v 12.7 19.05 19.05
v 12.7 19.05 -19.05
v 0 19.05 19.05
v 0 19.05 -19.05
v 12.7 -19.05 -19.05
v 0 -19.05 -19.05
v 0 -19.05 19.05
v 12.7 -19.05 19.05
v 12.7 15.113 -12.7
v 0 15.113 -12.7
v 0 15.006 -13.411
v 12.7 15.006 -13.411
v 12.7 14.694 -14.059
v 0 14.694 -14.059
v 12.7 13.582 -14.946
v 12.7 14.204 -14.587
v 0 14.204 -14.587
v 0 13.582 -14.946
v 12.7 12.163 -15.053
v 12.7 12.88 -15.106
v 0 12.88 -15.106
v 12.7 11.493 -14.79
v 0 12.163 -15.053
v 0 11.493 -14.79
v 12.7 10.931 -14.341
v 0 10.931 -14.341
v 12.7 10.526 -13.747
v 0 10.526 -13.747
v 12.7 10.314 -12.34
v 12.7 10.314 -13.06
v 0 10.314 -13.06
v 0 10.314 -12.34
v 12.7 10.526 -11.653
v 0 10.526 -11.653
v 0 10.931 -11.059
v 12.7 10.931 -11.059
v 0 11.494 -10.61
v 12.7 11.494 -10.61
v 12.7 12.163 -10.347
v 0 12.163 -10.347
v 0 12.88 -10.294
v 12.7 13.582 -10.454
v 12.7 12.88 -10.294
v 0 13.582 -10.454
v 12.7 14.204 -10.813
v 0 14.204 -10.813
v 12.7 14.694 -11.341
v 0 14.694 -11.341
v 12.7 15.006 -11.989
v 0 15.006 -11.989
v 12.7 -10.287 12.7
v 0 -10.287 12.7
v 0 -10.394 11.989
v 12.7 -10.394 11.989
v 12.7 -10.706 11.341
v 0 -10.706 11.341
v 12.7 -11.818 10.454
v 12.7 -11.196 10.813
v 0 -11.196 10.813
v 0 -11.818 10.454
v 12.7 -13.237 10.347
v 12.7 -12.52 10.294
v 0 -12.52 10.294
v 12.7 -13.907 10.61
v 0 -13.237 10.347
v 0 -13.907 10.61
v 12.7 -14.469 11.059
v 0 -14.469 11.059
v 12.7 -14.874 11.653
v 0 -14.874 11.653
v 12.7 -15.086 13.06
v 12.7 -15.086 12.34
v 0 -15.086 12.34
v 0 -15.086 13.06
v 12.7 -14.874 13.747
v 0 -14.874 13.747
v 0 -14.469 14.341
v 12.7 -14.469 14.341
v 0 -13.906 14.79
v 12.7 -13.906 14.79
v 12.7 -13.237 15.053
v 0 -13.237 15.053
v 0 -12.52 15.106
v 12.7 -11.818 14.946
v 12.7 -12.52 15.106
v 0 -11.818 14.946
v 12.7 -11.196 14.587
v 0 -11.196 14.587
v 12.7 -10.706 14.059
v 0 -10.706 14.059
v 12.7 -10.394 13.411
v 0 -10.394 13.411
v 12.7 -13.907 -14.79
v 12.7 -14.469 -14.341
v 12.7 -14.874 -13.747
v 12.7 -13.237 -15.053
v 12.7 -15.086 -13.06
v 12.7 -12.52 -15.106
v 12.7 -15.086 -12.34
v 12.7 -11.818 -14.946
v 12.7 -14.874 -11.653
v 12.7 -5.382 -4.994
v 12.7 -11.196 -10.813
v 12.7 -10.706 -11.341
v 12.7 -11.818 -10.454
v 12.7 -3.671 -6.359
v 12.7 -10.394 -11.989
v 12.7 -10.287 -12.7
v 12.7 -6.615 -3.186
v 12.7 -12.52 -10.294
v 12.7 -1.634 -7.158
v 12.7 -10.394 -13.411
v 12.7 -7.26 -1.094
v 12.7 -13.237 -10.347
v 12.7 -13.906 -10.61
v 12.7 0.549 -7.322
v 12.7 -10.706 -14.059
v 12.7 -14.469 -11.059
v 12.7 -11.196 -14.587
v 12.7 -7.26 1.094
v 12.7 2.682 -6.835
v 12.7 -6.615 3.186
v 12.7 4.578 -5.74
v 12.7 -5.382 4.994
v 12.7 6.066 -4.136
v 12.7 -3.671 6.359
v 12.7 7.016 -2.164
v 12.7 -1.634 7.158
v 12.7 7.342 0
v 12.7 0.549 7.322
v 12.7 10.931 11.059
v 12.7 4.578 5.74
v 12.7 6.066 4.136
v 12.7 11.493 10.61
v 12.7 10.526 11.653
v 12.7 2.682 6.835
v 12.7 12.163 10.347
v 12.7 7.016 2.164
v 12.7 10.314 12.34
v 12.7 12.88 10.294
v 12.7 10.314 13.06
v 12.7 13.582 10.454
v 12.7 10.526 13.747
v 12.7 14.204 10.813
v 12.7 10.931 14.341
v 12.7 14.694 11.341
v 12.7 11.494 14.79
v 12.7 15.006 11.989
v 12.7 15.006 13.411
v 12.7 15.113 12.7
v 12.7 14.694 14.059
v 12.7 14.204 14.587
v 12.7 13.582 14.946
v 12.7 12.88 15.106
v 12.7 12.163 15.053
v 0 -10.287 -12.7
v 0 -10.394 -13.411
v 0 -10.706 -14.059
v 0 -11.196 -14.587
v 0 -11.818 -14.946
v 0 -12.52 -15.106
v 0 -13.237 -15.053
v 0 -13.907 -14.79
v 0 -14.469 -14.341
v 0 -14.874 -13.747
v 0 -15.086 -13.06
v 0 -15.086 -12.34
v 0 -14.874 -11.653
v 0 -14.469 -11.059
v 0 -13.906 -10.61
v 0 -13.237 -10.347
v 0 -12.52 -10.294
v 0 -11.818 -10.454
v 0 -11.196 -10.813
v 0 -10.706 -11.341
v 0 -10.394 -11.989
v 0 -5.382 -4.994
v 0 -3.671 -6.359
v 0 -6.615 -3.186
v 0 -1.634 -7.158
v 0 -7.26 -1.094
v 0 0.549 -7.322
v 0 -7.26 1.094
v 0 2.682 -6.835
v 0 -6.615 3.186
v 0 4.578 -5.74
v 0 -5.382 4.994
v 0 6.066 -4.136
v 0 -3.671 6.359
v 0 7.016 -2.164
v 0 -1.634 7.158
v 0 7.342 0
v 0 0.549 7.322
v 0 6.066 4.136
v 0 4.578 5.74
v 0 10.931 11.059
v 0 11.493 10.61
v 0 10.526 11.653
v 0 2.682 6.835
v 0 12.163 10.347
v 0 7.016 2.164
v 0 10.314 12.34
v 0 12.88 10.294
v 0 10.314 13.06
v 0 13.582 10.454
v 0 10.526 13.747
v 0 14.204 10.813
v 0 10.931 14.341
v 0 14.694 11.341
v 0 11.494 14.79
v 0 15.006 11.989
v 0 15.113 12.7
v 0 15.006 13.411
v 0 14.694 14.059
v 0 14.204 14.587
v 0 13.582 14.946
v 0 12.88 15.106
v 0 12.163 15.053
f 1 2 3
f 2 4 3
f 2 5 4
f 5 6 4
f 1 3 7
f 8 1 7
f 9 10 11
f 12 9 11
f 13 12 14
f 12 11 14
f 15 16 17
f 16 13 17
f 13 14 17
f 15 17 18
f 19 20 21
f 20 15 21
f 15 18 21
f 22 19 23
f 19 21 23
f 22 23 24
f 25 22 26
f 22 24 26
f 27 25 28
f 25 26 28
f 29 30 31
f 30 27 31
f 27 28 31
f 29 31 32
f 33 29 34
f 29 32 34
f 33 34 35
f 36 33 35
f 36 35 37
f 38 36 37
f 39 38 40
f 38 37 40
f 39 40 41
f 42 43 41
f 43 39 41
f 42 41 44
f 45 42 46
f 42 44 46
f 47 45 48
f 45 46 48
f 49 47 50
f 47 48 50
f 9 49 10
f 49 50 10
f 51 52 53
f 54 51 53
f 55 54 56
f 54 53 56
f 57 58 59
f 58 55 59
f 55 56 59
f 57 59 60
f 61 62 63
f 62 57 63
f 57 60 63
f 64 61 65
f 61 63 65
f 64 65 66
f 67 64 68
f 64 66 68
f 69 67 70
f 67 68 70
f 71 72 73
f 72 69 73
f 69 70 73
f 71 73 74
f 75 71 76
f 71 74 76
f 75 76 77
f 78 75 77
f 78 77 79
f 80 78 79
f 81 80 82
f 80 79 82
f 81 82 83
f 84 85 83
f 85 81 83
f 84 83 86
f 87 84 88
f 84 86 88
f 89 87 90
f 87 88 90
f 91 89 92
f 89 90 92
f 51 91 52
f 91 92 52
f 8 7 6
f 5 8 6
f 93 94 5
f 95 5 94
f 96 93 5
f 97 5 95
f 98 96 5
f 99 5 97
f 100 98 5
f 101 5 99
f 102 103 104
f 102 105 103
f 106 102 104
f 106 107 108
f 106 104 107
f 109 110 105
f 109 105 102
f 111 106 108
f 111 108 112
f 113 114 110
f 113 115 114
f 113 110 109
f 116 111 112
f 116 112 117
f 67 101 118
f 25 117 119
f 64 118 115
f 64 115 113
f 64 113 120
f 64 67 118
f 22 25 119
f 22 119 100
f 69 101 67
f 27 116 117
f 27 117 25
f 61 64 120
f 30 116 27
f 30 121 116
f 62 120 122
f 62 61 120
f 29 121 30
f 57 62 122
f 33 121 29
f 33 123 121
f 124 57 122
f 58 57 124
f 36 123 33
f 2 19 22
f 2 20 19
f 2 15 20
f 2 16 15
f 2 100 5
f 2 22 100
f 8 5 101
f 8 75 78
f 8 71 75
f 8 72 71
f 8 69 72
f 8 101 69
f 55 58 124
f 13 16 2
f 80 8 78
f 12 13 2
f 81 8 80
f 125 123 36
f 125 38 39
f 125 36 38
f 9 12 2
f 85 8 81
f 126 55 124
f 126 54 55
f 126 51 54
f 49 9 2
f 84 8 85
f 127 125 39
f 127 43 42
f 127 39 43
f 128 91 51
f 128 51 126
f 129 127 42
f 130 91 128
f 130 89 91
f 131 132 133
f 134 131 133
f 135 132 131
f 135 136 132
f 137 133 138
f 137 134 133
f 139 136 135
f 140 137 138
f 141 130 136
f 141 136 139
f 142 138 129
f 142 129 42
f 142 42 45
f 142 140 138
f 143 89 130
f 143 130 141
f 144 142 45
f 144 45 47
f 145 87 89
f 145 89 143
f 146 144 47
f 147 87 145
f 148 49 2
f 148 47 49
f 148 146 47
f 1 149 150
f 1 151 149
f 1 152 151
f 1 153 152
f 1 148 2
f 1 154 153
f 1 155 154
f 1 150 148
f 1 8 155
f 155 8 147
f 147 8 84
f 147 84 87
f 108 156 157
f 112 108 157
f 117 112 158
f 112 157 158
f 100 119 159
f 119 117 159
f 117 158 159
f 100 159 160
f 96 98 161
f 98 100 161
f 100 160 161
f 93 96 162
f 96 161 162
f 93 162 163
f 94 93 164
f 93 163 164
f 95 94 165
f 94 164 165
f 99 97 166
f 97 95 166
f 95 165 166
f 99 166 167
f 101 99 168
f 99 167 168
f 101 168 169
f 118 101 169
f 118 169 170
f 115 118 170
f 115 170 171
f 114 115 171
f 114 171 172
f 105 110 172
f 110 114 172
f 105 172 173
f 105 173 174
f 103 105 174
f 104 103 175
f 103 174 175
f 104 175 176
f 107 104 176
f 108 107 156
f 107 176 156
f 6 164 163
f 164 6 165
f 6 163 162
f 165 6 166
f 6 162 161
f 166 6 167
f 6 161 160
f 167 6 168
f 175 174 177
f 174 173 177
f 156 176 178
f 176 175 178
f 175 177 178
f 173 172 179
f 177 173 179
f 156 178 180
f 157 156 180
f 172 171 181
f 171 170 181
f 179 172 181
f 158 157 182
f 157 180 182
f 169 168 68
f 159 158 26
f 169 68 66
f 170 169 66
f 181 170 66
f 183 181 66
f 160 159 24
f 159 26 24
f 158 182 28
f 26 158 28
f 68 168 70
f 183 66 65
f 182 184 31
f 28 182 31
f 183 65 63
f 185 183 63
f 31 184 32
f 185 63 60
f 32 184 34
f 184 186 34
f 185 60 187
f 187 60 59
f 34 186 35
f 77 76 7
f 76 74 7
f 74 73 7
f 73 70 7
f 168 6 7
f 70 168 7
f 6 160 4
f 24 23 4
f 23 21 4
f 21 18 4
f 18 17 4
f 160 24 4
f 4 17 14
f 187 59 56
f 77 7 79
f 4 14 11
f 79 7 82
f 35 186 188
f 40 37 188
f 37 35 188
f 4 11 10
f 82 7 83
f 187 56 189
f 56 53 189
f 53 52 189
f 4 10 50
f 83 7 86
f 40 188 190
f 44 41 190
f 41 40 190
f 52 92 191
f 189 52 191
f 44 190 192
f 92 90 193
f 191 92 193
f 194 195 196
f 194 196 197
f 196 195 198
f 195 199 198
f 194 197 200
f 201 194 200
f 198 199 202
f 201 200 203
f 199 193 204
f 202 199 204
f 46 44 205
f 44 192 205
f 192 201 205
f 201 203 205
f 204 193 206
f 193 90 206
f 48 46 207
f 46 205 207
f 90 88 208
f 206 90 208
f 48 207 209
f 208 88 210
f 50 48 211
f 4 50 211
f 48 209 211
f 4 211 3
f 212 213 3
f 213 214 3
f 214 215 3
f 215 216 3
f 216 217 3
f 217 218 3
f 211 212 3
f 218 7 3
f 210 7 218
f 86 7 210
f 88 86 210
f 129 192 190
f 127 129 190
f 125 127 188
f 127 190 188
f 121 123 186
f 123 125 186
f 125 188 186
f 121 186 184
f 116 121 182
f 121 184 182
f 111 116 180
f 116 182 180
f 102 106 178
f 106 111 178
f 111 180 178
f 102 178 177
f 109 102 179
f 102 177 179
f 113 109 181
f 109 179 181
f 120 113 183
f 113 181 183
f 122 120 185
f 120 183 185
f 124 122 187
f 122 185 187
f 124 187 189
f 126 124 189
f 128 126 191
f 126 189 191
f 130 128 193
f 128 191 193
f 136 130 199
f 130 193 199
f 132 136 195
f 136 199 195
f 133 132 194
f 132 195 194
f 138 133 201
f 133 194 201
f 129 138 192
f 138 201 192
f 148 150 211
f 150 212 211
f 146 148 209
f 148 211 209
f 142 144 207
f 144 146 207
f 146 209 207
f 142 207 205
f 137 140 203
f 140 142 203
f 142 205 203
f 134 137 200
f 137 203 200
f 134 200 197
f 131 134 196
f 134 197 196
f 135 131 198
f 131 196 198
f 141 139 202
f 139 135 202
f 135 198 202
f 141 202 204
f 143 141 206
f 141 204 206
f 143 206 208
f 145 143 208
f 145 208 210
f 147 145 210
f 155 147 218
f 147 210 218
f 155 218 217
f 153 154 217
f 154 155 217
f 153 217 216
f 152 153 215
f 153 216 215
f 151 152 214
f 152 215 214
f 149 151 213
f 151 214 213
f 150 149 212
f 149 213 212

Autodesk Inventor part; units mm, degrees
ref_plane "YZ Plane" through (0, 0, 0) normal (1, 0, 0) x (0, 1, 0)
ref_plane "XZ Plane" through (0, 0, 0) normal (0, 1, 0) x (-1, 0, 0)
ref_plane "XY Plane" through (0, 0, 0) normal (0, 0, 1) x (1, 0, 0)
sketch "Sketch1" plane through (0, 0, 0) normal (1, 0, 0) x (0, 1, 0)
  line L0 (0, -26.67) -> (0, 26.67) construction
  line L1 (-26.67, 0) -> (26.67, 0) construction
  line L2 (19.05, 19.05) -> (-19.05, 19.05)
  line L3 (-19.05, 19.05) -> (-19.05, -19.05)
  line L4 (-19.05, -19.05) -> (19.05, -19.05)
  line L5 (19.05, -19.05) -> (19.05, 19.05)
  circle A0 centre (0, 0) radius 7.3422
  line L6 (12.7, 12.7) -> (-12.7, 12.7) construction
  line L7 (-12.7, 12.7) -> (-12.7, -12.7) construction
  line L8 (-12.7, -12.7) -> (12.7, -12.7) construction
  line L9 (12.7, -12.7) -> (12.7, 12.7) construction
  circle A1 centre (12.7, 12.7) radius 2.413
  circle A2 centre (12.7, -12.7) radius 2.413
  circle A3 centre (-12.7, -12.7) radius 2.413
  circle A4 centre (-12.7, 12.7) radius 2.413
  point P0 (19.05, 0)
  point P1 (0, 19.05)
  point P2 (12.7, 0)
  point P3 (0, 12.7)
  dimension "d0" = 38.1
  dimension "d1" = 14.6844
  dimension "d2" = 4.826
  dimension "d3" = 25.4
extrude "Extrusion1" add sketch "Sketch1" along normal blind 12.7
properties part number "Joint Mount" material "Aluminum 6061"
